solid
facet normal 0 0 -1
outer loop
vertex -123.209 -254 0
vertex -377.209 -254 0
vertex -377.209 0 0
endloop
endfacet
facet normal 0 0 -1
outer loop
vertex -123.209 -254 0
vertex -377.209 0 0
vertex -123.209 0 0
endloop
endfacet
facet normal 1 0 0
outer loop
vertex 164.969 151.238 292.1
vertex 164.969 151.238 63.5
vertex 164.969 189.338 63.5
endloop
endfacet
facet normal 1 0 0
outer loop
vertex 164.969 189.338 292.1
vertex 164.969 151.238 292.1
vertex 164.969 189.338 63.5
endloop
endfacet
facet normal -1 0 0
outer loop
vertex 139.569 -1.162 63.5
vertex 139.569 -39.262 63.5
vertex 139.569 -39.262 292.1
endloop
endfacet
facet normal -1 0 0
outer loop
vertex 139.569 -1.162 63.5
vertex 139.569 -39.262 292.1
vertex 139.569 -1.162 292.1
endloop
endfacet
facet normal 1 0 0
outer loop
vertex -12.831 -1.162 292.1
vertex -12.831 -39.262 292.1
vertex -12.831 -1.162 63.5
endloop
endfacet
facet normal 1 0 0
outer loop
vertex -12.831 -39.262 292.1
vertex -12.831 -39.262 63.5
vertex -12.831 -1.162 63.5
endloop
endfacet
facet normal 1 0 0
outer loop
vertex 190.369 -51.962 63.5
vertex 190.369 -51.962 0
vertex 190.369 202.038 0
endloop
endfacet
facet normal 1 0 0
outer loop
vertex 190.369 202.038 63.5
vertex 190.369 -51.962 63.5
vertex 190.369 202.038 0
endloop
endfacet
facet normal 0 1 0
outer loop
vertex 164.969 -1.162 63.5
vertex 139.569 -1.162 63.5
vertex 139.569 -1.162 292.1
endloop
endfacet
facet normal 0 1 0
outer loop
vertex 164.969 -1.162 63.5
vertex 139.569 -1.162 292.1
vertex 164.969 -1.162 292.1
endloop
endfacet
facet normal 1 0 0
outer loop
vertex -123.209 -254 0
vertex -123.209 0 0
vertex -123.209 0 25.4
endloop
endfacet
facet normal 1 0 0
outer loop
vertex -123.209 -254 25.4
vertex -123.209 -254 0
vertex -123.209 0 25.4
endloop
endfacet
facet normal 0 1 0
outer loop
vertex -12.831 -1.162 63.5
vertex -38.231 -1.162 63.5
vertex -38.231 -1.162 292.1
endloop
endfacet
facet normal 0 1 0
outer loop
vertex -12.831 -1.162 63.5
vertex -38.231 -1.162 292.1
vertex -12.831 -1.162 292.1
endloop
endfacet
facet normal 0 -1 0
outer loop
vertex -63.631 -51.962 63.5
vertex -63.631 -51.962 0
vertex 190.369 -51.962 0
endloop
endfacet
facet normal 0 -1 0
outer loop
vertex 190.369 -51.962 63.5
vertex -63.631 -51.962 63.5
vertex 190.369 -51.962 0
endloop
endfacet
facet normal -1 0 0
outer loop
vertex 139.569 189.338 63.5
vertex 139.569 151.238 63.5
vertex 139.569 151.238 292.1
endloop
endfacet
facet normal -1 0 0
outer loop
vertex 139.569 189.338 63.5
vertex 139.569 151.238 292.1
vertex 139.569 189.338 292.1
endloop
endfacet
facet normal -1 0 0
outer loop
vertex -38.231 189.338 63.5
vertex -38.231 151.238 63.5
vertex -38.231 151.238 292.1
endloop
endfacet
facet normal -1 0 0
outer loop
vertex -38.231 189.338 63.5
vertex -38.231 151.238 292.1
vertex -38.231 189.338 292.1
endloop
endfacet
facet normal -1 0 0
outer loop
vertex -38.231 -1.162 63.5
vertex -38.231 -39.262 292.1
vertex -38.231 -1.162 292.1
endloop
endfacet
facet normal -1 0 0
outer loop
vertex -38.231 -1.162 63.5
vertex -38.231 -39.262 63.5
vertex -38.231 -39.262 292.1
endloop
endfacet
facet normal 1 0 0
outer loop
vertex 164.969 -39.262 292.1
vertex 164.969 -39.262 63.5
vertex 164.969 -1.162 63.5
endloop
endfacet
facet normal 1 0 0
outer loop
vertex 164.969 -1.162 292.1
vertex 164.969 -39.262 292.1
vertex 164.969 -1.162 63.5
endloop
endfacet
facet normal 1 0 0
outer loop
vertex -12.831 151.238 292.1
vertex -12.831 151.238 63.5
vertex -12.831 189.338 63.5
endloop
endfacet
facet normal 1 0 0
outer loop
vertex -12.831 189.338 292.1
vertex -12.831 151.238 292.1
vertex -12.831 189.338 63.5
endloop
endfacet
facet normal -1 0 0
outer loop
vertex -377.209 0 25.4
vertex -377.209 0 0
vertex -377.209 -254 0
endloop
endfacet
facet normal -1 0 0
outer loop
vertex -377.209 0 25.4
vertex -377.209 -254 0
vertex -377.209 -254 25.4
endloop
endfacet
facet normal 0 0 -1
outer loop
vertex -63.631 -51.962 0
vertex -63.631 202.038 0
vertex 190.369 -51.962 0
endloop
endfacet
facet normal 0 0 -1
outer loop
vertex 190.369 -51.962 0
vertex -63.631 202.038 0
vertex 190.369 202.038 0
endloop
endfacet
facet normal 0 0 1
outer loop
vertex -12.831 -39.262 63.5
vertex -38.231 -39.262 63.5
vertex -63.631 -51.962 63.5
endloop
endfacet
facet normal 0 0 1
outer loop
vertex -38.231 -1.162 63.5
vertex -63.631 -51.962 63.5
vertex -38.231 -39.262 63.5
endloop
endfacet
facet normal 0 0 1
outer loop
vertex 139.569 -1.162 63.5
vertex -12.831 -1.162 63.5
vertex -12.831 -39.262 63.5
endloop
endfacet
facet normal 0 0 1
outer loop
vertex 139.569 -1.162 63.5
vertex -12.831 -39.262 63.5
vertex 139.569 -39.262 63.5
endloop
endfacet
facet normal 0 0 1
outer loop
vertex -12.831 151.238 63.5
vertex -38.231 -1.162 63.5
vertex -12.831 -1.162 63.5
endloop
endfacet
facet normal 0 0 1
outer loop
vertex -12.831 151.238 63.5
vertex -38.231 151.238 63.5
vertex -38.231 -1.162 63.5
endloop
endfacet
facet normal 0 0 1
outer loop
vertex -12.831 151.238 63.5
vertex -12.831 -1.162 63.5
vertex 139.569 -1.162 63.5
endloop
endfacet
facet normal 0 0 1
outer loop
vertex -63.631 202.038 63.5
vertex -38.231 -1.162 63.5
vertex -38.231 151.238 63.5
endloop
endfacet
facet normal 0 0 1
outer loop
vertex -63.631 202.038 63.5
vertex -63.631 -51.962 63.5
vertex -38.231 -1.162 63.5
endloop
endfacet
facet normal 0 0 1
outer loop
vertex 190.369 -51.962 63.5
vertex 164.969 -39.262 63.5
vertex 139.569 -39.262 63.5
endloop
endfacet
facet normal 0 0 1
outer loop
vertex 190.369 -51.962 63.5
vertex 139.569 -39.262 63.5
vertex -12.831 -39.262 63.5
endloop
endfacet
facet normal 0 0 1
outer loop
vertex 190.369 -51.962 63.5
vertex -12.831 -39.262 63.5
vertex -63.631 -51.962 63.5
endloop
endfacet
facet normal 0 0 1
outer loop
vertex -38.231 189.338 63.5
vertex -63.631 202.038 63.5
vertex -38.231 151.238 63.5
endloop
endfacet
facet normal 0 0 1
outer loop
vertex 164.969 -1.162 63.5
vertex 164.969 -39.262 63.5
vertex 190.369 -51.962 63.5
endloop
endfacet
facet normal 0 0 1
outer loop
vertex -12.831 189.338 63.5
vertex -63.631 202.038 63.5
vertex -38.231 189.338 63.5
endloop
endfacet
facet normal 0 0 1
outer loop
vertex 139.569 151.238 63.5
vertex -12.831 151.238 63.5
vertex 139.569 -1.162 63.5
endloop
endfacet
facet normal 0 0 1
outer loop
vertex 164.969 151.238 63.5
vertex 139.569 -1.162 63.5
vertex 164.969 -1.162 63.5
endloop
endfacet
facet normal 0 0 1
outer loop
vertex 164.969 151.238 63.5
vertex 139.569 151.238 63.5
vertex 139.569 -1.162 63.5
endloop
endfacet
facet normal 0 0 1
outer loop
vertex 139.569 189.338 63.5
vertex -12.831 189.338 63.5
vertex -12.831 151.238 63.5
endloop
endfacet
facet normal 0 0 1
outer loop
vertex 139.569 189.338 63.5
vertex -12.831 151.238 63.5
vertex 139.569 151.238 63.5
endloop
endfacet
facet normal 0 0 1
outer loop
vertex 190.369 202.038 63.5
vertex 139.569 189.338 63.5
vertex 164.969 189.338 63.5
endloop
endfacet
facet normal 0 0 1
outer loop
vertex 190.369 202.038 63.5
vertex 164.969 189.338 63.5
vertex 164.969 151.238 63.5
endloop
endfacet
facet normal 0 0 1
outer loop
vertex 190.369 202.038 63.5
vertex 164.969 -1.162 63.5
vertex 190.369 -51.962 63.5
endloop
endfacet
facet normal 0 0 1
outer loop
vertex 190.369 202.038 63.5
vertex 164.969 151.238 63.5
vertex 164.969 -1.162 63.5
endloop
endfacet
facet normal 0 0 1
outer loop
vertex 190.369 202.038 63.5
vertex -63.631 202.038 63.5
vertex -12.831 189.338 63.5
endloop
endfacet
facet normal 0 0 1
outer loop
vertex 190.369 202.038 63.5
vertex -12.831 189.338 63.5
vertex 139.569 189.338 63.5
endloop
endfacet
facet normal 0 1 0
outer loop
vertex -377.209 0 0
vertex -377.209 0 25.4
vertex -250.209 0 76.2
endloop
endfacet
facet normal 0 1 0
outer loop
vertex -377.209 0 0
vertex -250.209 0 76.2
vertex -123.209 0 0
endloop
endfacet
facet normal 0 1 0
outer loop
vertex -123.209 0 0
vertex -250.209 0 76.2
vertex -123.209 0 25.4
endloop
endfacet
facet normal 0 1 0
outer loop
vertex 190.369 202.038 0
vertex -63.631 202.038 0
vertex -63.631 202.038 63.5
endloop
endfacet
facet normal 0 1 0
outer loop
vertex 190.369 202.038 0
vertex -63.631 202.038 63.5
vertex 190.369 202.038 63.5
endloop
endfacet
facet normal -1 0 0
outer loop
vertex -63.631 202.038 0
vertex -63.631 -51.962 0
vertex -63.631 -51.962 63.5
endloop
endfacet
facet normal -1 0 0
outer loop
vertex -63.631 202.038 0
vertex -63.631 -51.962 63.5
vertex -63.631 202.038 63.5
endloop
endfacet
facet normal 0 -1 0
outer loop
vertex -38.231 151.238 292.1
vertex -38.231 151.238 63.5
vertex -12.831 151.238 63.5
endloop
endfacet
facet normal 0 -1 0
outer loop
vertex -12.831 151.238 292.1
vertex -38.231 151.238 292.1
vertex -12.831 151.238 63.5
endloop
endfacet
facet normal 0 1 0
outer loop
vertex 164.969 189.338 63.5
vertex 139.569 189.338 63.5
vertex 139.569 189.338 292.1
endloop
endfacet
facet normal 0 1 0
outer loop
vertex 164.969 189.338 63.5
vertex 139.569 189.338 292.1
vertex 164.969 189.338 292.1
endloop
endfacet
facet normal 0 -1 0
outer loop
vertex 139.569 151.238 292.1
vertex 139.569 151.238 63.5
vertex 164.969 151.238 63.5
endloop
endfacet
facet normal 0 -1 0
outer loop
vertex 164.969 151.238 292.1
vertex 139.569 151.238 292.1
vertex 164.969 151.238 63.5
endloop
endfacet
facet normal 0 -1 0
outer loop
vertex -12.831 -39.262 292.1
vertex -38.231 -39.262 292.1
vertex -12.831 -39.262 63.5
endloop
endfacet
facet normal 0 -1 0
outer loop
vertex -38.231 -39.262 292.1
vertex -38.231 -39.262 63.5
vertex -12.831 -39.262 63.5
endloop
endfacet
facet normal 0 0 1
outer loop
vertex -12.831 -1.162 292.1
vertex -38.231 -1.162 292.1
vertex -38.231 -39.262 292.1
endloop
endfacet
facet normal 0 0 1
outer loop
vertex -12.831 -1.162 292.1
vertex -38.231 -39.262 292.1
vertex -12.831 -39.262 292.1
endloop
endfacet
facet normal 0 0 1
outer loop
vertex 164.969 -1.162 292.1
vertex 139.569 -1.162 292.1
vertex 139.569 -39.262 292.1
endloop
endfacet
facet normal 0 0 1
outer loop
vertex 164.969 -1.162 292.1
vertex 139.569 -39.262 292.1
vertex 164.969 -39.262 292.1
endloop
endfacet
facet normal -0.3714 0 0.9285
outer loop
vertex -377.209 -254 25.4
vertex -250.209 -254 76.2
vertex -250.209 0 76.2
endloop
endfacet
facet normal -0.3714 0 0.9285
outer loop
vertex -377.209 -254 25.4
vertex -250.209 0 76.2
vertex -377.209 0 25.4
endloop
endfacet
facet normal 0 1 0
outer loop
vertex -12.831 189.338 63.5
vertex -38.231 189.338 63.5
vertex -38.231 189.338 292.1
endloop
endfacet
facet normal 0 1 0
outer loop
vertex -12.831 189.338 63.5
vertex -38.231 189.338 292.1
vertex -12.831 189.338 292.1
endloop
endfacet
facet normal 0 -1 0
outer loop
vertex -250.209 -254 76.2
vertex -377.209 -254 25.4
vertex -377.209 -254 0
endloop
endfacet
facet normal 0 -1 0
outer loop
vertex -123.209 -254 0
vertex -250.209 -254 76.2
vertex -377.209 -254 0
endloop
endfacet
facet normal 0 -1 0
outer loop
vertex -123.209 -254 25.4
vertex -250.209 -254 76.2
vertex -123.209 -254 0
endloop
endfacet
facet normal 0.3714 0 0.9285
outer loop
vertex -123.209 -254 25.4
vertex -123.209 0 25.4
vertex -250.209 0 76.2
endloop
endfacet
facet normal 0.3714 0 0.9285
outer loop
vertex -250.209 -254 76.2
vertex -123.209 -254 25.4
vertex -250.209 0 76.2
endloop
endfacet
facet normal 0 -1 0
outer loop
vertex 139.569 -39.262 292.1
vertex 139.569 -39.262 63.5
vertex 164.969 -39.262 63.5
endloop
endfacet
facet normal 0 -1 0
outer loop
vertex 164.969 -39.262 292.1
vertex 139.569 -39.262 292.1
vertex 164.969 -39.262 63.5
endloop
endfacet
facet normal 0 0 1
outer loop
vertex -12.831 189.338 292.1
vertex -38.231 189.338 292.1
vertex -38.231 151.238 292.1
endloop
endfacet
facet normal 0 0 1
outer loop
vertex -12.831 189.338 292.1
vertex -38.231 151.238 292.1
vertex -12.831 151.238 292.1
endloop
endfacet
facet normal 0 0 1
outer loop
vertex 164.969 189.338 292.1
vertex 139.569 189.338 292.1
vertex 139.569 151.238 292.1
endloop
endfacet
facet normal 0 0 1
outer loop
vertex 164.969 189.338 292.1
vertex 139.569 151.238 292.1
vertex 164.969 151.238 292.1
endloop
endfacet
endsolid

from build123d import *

# Parameters (mm, degrees)
F0_W      = 254
F0_H      = 254
F1_DEPTH  = 63.5
F2_W      = 25.4
F2_H      = 38.1
F3_DEPTH  = 50.8
F3_FACE_W = 25.4
F3_FACE_H = 38.1
F4_DEPTH  = 177.8
F5_W      = 127
F5_H      = 25.4
F6_DEPTH  = 254


with BuildPart() as f1:
    # F0 (on Top) → F1 (new body)
    with BuildSketch(Plane.XY):
        with Locations((63.368681, 75.037781)):
            Rectangle(F0_W, F0_H)
    extrude(amount=F1_DEPTH)

    # F2 (on face) → F3 (join)
    with BuildSketch(Plane.XY.offset(63.5)):
        with Locations((-25.531319, 170.287781)):
            Rectangle(F2_W, F2_H)
        with Locations((-25.531319, -20.212219)):
            Rectangle(F2_W, F2_H)
        with Locations((152.268681, -20.212219)):
            Rectangle(F2_W, F2_H)
        with Locations((152.268681, 170.287781)):
            Rectangle(F2_W, F2_H)
    extrude(amount=F3_DEPTH)

    # F3_face (on face) → F4 (join)
    with BuildSketch(Plane(origin=(-25.531319, -20.212219, 114.3), x_dir=(1, 0, 0), z_dir=(0, 0, 1))):
        Rectangle(F3_FACE_W, F3_FACE_H)
        with Locations((177.8, 0)):
            Rectangle(F3_FACE_W, F3_FACE_H)
        with Locations((177.8, 190.5)):
            Rectangle(F3_FACE_W, F3_FACE_H)
        with Locations((0, 190.5)):
            Rectangle(F3_FACE_W, F3_FACE_H)
    extrude(amount=F4_DEPTH)


with BuildPart() as f6:
    # F5 (on Front) → F6 (new body)
    with BuildSketch(Plane.XZ):
        Polygon((-377.209485, 25.4), (-250.209485, 25.4), (-250.209485, 50.8), (-250.209485, 76.2), align=None)
        Polygon((-250.209485, 50.8), (-250.209485, 25.4), (-123.209485, 25.4), (-250.209485, 76.2), align=None)
        with Locations((-186.709485, 12.7)):
            Rectangle(F5_W, F5_H)
        with Locations((-313.709485, 12.7)):
            Rectangle(F5_W, F5_H)
    extrude(amount=F6_DEPTH)


solid = Compound([f1.part, f6.part])
